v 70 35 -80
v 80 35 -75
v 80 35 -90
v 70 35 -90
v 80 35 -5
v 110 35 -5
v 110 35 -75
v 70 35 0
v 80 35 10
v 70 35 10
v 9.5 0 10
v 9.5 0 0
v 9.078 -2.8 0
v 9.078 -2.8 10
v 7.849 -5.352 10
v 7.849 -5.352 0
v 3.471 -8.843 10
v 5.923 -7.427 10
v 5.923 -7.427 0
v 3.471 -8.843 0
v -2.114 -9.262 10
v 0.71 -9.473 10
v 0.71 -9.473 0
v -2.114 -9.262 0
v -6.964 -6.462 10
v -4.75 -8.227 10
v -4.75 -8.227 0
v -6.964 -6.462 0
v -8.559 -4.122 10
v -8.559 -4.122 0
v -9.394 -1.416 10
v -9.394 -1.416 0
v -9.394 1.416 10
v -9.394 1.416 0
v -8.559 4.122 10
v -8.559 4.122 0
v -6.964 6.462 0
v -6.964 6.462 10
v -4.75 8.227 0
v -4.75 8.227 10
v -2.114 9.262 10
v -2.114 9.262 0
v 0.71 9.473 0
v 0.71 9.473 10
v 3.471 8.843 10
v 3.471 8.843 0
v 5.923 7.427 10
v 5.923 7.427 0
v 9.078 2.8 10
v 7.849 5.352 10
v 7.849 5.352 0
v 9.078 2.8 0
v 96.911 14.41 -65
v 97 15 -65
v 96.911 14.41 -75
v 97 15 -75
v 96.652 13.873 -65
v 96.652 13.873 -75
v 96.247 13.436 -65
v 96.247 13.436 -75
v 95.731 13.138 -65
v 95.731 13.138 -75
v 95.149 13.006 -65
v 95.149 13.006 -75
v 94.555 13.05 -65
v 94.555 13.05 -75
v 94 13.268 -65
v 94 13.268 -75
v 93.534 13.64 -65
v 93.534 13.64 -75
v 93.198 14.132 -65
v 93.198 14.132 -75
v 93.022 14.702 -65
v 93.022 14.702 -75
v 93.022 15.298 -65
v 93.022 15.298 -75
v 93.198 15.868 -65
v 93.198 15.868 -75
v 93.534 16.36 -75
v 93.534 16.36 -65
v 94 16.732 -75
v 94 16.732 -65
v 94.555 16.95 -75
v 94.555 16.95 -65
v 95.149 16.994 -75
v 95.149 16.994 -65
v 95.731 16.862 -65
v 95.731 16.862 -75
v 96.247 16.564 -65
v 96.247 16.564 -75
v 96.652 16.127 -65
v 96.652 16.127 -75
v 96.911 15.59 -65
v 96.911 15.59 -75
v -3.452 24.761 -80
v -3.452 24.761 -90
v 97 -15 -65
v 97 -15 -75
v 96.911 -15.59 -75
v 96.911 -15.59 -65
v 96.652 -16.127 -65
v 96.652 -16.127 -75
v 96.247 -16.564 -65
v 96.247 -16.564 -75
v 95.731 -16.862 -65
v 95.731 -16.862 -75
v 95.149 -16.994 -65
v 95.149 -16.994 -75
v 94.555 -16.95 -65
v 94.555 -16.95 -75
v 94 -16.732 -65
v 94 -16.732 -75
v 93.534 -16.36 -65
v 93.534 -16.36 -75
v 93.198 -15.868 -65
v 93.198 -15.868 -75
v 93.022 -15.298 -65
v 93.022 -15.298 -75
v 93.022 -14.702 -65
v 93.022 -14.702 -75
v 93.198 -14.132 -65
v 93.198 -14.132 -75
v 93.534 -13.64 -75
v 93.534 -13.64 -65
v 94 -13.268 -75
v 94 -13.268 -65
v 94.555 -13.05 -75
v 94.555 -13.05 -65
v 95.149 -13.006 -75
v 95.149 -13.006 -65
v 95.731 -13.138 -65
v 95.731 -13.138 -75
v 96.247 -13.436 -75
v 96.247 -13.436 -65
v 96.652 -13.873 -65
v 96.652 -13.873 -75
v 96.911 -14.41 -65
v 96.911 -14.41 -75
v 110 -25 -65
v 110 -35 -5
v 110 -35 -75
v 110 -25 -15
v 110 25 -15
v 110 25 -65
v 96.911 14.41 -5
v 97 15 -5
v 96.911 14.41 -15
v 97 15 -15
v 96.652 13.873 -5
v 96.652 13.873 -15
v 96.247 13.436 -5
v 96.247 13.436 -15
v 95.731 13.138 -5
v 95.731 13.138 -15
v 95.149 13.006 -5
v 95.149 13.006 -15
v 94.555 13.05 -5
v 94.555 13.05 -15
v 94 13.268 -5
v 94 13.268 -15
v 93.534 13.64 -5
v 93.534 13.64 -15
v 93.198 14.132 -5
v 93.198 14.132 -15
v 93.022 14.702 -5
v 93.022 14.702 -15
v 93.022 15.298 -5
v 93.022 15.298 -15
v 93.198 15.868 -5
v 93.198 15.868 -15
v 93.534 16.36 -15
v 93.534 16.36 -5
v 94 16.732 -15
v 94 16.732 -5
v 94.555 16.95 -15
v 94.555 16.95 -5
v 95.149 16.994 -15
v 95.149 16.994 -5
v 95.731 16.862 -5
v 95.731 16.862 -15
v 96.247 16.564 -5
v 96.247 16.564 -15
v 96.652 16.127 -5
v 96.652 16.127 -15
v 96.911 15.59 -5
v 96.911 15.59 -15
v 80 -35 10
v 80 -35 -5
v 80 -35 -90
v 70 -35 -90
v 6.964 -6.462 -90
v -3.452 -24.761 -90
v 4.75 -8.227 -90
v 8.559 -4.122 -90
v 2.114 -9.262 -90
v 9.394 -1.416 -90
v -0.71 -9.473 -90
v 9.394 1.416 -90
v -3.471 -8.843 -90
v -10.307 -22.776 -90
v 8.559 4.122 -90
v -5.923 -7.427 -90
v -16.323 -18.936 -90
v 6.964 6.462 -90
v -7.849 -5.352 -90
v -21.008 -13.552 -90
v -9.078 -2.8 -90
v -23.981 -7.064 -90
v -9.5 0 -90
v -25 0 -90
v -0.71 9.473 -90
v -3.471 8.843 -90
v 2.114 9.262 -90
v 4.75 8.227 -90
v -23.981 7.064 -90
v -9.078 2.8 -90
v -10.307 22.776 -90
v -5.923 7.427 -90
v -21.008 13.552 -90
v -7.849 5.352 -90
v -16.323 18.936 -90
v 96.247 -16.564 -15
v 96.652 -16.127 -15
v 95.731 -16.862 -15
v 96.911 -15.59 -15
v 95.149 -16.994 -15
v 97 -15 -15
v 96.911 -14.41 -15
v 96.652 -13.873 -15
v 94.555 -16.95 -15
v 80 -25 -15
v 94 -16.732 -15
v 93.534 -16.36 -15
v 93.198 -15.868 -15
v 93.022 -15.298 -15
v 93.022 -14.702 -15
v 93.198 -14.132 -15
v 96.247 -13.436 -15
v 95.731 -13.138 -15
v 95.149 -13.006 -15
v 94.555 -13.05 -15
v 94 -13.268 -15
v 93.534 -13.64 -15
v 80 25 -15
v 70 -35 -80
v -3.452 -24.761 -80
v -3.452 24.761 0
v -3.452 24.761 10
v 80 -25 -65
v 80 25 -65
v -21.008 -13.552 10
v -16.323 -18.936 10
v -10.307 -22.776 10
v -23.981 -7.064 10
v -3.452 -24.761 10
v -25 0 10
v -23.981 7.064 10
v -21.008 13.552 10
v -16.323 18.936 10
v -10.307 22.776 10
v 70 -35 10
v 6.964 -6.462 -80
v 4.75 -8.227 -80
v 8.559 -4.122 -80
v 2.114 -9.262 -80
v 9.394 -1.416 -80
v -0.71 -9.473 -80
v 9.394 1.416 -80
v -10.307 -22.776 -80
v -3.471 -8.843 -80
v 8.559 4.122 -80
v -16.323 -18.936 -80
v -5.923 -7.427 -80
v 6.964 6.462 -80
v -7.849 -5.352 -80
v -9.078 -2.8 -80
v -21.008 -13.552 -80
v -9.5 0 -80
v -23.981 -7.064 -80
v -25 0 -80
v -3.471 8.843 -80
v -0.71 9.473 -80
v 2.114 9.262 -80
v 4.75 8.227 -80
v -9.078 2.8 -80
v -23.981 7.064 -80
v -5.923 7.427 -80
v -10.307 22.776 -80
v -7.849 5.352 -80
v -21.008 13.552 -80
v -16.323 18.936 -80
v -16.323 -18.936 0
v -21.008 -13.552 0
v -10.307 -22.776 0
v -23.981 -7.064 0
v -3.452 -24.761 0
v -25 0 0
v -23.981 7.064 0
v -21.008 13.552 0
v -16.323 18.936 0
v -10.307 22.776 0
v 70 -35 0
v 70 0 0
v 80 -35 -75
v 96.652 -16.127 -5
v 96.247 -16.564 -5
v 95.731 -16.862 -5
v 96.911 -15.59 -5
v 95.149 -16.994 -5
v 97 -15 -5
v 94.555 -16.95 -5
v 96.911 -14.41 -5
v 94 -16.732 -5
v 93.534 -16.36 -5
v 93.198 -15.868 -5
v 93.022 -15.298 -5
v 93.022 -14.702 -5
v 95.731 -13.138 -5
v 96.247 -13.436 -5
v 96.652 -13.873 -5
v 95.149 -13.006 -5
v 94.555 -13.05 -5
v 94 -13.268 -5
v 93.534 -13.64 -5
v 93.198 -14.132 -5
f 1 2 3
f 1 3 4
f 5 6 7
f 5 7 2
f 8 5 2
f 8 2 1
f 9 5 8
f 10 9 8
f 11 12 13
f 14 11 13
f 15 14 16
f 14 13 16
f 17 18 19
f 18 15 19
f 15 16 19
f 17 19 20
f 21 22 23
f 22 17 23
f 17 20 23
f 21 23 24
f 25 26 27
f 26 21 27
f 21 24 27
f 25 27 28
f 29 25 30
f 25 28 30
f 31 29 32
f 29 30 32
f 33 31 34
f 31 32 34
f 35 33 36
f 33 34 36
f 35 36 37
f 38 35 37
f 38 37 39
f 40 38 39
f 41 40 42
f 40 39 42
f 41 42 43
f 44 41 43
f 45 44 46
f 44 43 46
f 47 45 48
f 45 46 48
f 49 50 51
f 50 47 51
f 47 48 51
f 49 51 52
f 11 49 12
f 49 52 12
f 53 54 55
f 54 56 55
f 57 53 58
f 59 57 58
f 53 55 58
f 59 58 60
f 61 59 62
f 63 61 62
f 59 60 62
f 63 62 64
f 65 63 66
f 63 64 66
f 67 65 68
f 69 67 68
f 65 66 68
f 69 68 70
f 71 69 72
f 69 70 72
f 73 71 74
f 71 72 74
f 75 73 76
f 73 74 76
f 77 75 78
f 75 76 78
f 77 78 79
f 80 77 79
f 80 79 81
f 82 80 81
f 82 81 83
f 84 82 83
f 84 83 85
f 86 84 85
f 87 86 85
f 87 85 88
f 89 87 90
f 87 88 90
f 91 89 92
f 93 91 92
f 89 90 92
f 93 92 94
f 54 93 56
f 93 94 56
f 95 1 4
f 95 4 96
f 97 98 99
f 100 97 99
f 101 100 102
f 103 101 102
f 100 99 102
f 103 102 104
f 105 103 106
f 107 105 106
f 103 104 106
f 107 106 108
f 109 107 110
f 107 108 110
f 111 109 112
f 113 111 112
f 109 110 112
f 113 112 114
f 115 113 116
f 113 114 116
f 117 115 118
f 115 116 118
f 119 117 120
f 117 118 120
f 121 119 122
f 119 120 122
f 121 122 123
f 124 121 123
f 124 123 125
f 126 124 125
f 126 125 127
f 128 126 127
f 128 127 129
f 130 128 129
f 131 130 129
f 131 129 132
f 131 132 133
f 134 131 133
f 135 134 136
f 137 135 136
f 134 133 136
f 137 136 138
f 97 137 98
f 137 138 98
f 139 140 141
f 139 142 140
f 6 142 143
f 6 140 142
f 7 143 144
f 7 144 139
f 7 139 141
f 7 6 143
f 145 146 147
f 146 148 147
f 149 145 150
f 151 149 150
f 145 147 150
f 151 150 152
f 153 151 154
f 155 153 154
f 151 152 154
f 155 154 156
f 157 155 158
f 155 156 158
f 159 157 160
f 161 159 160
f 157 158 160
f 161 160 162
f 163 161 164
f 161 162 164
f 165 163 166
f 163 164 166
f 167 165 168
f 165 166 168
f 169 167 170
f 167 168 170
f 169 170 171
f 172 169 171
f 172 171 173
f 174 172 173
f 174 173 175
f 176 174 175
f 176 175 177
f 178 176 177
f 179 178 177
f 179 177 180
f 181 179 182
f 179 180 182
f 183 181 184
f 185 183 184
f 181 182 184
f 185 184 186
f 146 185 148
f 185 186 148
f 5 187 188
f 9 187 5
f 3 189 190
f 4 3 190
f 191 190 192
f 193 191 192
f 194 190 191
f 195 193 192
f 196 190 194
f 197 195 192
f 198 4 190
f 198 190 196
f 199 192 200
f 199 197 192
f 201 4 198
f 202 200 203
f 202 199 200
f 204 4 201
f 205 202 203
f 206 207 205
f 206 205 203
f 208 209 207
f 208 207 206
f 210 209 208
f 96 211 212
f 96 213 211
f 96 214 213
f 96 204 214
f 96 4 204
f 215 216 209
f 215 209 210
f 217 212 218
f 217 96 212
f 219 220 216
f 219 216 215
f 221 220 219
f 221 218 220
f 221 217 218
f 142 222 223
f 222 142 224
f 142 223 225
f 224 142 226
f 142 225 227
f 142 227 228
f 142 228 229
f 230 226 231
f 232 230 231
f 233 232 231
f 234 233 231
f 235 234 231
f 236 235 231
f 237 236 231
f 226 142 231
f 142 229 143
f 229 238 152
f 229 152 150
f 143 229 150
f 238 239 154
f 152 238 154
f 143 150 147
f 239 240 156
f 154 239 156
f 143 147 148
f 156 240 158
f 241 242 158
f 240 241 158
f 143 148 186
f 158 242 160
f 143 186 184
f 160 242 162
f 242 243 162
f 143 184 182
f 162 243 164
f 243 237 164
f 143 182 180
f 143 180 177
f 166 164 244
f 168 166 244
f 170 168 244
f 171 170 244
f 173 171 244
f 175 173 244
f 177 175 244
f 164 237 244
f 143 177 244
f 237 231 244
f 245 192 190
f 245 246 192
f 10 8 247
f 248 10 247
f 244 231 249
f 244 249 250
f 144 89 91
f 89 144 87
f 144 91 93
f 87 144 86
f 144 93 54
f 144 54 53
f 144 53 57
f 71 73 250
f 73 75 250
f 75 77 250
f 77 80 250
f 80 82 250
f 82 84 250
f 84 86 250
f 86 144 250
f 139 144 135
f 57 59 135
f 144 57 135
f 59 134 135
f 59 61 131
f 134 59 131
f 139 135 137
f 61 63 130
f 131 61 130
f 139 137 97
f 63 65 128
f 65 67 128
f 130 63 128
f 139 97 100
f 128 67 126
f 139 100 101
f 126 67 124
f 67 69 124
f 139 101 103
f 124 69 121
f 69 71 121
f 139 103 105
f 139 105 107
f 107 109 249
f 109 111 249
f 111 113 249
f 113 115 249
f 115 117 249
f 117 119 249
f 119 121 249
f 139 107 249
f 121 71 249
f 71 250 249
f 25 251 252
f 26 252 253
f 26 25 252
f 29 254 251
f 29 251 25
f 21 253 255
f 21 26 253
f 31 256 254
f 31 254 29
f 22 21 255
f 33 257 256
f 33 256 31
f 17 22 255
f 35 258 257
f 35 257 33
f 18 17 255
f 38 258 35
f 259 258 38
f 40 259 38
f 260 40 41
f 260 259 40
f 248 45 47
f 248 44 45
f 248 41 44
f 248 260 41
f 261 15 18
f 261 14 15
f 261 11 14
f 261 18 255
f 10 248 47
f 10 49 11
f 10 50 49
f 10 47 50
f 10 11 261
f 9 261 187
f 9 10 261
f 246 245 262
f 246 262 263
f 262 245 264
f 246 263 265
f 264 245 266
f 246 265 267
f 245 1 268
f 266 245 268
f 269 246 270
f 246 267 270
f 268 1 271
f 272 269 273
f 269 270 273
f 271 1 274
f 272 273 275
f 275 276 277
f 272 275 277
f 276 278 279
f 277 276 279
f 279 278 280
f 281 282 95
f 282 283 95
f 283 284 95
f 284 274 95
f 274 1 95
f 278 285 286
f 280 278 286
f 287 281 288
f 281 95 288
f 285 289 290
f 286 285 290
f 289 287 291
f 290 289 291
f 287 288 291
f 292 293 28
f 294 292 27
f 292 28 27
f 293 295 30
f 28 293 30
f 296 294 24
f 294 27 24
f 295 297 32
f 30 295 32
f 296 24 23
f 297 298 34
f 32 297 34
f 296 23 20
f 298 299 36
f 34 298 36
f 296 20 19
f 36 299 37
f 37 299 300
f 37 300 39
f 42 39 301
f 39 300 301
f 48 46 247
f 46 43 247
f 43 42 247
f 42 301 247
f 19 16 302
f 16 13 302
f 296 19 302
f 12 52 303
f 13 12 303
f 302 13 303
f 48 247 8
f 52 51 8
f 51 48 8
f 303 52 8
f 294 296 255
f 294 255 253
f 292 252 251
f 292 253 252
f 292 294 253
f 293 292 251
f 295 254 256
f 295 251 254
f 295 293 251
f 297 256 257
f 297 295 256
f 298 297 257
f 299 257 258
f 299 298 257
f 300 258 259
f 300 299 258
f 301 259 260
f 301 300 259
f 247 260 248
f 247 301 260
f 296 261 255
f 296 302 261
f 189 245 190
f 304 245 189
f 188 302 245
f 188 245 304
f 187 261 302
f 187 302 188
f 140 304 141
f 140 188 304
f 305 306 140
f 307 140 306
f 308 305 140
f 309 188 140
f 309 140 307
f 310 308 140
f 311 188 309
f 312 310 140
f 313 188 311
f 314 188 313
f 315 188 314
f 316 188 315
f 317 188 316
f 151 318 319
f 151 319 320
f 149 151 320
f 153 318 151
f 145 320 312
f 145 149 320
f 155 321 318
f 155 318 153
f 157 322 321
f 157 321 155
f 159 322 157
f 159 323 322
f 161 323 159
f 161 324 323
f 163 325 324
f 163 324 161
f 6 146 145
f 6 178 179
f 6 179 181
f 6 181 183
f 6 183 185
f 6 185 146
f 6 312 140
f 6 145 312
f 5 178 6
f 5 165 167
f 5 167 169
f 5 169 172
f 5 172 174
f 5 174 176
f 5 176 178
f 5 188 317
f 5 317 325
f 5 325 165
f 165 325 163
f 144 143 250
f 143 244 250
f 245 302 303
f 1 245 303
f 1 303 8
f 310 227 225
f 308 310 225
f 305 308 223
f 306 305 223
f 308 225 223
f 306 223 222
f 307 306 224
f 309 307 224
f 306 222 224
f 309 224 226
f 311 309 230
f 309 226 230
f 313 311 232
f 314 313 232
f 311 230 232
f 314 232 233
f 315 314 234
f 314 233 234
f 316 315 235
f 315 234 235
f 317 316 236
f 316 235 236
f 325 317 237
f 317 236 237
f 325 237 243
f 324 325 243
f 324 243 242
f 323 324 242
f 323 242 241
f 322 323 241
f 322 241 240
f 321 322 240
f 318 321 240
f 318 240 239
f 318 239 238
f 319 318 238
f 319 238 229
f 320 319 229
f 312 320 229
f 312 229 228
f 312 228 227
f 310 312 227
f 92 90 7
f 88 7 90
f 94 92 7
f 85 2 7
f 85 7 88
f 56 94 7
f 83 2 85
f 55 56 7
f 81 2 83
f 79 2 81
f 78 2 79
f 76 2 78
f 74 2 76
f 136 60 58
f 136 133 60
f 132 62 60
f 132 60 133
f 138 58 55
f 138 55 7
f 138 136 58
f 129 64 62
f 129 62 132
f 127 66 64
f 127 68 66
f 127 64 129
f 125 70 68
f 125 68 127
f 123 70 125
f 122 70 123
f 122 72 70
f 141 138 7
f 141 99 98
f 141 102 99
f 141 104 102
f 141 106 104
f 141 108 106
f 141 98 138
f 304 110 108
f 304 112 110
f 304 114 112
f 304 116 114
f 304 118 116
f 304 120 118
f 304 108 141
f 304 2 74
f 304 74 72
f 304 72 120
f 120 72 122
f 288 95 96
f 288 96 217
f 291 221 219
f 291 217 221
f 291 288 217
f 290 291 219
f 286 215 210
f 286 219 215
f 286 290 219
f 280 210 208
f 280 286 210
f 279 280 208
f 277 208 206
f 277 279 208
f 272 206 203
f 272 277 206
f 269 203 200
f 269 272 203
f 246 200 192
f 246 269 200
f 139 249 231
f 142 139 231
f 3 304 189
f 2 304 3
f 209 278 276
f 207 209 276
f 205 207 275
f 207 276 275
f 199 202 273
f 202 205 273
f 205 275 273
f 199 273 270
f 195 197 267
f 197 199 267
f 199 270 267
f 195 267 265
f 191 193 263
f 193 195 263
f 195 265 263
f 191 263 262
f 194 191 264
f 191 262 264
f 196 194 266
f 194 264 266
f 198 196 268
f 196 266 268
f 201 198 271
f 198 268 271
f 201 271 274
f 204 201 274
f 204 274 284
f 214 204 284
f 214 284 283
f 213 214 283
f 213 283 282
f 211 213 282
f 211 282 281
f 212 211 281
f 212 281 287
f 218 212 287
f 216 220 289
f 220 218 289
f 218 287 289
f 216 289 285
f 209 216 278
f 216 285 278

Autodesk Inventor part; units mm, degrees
ref_plane "YZ Plane" through (0, 0, 0) normal (1, 0, 0) x (0, 1, 0)
ref_plane "XZ Plane" through (0, 0, 0) normal (0, 1, 0) x (-1, 0, 0)
sketch "Sketch1" plane through (0, 0, 0) normal (0, 0, 1) x (1, 0, 0)
  circle A0 centre (0, 0) radius 9.5
  line L0 (70, 35) -> (80, 35)
  line L1 (80, 35) -> (80, -35)
  line L2 (80, -35) -> (70, -35)
  line L3 (70, -35) -> (70, 35)
  line L4 (70, 35) -> (80, -35) construction
  line L5 (80, 35) -> (70, -35) construction
  arc A1 (-3.4517, 24.7606) -> (-3.4517, -24.7606) centre (0, 0) ccw
  line L6 (70, 35) -> (-3.4517, 24.7606)
  line L7 (70, -35) -> (-3.4517, -24.7606)
  line L8 (0, 0) -> (70, 0)
  point P0 (75, 0)
  dimension "d0" = 19
  dimension "d11" = 10
  dimension "d12" = 70
  dimension "d13" = 50
  dimension "d25" = 70
extrude "Extrusion1" add sketch "Sketch1" along normal blind 10
ref_plane "Work Plane1" through (0, 0, -80) normal (0, 0, -1) x (-1, 0, 0)
sketch "Sketch2" plane through (0, 0, -80) normal (0, 0, -1) x (-1, 0, 0)
  circle A0 centre (0, 0) radius 9.5 projected
  arc A1 (3.4517, -24.7606) -> (3.4517, 24.7606) centre (0, 0) ccw projected
  line L0 (-70, 35) -> (3.4517, 24.7606) projected
  line L1 (-80, 35) -> (-70, 35) projected
  line L2 (-80, -35) -> (-80, 35) projected
  line L3 (-70, -35) -> (-80, -35) projected
  line L4 (3.4517, -24.7606) -> (-70, -35) projected
  circle A2 centre (0, 0) radius 9.5 projected
extrude "Extrusion2" add sketch "Sketch2" along normal blind 10
extrude "Extrusion3" add sketch "Sketch1" against normal blind 80 contours L3 L0 L1 L2
sketch "Sketch3" plane through (80, -35, 10) normal (1, 0, 0) x (0, 0, -1)
  line L0 (0, 0) -> (0, 70) construction
  line L1 (0, 70) -> (100, 0) construction
  line L2 (100, 0) -> (0, 0) projected
  line L3 (15, 70) -> (85, 70)
  line L4 (85, 70) -> (85, 0)
  line L5 (85, 0) -> (15, 0)
  line L6 (15, 0) -> (15, 70)
  line L7 (15, 70) -> (85, 0) construction
  line L8 (85, 70) -> (15, 0) construction
  line L9 (25, 60) -> (75, 60)
  line L10 (75, 60) -> (75, 10)
  line L11 (75, 10) -> (25, 10)
  line L12 (25, 10) -> (25, 60)
  line L13 (25, 60) -> (75, 10) construction
  line L14 (75, 60) -> (25, 10) construction
  point P0 (10, 35)
  point P1 (50, 35)
  point P2 (50, 35)
  point P3 (15, 0)
  point P4 (160, 0)
  dimension "d14" = 70
  dimension "d15" = 50
  dimension "d16" = 50
extrude "Extrusion4" add sketch "Sketch3" along normal blind 30
sketch "Sketch4" plane through (70, 35, -75) normal (0, 0, -1) x (1, 0, 0)
  line L0 (10, 0) -> (40, 0) construction
  line L1 (40, 70) -> (40, 0) construction
  line L2 (10, 0) -> (40, 70) construction
  line L3 (25, 35) -> (25, 50) construction
  line L4 (25, 50) -> (25, 20) construction
  circle A0 centre (25, 50) radius 2
  circle A1 centre (25, 20) radius 2
  point P0 (-70, 35)
  dimension "d19" = 15
  dimension "d20" = 30
  dimension "d21" = 4
  dimension "d22" = 4
extrude "Extrusion5" cut sketch "Sketch4" against normal blind 70
properties part number "Forearm-End Fork" material "Acrylic, Clear"
